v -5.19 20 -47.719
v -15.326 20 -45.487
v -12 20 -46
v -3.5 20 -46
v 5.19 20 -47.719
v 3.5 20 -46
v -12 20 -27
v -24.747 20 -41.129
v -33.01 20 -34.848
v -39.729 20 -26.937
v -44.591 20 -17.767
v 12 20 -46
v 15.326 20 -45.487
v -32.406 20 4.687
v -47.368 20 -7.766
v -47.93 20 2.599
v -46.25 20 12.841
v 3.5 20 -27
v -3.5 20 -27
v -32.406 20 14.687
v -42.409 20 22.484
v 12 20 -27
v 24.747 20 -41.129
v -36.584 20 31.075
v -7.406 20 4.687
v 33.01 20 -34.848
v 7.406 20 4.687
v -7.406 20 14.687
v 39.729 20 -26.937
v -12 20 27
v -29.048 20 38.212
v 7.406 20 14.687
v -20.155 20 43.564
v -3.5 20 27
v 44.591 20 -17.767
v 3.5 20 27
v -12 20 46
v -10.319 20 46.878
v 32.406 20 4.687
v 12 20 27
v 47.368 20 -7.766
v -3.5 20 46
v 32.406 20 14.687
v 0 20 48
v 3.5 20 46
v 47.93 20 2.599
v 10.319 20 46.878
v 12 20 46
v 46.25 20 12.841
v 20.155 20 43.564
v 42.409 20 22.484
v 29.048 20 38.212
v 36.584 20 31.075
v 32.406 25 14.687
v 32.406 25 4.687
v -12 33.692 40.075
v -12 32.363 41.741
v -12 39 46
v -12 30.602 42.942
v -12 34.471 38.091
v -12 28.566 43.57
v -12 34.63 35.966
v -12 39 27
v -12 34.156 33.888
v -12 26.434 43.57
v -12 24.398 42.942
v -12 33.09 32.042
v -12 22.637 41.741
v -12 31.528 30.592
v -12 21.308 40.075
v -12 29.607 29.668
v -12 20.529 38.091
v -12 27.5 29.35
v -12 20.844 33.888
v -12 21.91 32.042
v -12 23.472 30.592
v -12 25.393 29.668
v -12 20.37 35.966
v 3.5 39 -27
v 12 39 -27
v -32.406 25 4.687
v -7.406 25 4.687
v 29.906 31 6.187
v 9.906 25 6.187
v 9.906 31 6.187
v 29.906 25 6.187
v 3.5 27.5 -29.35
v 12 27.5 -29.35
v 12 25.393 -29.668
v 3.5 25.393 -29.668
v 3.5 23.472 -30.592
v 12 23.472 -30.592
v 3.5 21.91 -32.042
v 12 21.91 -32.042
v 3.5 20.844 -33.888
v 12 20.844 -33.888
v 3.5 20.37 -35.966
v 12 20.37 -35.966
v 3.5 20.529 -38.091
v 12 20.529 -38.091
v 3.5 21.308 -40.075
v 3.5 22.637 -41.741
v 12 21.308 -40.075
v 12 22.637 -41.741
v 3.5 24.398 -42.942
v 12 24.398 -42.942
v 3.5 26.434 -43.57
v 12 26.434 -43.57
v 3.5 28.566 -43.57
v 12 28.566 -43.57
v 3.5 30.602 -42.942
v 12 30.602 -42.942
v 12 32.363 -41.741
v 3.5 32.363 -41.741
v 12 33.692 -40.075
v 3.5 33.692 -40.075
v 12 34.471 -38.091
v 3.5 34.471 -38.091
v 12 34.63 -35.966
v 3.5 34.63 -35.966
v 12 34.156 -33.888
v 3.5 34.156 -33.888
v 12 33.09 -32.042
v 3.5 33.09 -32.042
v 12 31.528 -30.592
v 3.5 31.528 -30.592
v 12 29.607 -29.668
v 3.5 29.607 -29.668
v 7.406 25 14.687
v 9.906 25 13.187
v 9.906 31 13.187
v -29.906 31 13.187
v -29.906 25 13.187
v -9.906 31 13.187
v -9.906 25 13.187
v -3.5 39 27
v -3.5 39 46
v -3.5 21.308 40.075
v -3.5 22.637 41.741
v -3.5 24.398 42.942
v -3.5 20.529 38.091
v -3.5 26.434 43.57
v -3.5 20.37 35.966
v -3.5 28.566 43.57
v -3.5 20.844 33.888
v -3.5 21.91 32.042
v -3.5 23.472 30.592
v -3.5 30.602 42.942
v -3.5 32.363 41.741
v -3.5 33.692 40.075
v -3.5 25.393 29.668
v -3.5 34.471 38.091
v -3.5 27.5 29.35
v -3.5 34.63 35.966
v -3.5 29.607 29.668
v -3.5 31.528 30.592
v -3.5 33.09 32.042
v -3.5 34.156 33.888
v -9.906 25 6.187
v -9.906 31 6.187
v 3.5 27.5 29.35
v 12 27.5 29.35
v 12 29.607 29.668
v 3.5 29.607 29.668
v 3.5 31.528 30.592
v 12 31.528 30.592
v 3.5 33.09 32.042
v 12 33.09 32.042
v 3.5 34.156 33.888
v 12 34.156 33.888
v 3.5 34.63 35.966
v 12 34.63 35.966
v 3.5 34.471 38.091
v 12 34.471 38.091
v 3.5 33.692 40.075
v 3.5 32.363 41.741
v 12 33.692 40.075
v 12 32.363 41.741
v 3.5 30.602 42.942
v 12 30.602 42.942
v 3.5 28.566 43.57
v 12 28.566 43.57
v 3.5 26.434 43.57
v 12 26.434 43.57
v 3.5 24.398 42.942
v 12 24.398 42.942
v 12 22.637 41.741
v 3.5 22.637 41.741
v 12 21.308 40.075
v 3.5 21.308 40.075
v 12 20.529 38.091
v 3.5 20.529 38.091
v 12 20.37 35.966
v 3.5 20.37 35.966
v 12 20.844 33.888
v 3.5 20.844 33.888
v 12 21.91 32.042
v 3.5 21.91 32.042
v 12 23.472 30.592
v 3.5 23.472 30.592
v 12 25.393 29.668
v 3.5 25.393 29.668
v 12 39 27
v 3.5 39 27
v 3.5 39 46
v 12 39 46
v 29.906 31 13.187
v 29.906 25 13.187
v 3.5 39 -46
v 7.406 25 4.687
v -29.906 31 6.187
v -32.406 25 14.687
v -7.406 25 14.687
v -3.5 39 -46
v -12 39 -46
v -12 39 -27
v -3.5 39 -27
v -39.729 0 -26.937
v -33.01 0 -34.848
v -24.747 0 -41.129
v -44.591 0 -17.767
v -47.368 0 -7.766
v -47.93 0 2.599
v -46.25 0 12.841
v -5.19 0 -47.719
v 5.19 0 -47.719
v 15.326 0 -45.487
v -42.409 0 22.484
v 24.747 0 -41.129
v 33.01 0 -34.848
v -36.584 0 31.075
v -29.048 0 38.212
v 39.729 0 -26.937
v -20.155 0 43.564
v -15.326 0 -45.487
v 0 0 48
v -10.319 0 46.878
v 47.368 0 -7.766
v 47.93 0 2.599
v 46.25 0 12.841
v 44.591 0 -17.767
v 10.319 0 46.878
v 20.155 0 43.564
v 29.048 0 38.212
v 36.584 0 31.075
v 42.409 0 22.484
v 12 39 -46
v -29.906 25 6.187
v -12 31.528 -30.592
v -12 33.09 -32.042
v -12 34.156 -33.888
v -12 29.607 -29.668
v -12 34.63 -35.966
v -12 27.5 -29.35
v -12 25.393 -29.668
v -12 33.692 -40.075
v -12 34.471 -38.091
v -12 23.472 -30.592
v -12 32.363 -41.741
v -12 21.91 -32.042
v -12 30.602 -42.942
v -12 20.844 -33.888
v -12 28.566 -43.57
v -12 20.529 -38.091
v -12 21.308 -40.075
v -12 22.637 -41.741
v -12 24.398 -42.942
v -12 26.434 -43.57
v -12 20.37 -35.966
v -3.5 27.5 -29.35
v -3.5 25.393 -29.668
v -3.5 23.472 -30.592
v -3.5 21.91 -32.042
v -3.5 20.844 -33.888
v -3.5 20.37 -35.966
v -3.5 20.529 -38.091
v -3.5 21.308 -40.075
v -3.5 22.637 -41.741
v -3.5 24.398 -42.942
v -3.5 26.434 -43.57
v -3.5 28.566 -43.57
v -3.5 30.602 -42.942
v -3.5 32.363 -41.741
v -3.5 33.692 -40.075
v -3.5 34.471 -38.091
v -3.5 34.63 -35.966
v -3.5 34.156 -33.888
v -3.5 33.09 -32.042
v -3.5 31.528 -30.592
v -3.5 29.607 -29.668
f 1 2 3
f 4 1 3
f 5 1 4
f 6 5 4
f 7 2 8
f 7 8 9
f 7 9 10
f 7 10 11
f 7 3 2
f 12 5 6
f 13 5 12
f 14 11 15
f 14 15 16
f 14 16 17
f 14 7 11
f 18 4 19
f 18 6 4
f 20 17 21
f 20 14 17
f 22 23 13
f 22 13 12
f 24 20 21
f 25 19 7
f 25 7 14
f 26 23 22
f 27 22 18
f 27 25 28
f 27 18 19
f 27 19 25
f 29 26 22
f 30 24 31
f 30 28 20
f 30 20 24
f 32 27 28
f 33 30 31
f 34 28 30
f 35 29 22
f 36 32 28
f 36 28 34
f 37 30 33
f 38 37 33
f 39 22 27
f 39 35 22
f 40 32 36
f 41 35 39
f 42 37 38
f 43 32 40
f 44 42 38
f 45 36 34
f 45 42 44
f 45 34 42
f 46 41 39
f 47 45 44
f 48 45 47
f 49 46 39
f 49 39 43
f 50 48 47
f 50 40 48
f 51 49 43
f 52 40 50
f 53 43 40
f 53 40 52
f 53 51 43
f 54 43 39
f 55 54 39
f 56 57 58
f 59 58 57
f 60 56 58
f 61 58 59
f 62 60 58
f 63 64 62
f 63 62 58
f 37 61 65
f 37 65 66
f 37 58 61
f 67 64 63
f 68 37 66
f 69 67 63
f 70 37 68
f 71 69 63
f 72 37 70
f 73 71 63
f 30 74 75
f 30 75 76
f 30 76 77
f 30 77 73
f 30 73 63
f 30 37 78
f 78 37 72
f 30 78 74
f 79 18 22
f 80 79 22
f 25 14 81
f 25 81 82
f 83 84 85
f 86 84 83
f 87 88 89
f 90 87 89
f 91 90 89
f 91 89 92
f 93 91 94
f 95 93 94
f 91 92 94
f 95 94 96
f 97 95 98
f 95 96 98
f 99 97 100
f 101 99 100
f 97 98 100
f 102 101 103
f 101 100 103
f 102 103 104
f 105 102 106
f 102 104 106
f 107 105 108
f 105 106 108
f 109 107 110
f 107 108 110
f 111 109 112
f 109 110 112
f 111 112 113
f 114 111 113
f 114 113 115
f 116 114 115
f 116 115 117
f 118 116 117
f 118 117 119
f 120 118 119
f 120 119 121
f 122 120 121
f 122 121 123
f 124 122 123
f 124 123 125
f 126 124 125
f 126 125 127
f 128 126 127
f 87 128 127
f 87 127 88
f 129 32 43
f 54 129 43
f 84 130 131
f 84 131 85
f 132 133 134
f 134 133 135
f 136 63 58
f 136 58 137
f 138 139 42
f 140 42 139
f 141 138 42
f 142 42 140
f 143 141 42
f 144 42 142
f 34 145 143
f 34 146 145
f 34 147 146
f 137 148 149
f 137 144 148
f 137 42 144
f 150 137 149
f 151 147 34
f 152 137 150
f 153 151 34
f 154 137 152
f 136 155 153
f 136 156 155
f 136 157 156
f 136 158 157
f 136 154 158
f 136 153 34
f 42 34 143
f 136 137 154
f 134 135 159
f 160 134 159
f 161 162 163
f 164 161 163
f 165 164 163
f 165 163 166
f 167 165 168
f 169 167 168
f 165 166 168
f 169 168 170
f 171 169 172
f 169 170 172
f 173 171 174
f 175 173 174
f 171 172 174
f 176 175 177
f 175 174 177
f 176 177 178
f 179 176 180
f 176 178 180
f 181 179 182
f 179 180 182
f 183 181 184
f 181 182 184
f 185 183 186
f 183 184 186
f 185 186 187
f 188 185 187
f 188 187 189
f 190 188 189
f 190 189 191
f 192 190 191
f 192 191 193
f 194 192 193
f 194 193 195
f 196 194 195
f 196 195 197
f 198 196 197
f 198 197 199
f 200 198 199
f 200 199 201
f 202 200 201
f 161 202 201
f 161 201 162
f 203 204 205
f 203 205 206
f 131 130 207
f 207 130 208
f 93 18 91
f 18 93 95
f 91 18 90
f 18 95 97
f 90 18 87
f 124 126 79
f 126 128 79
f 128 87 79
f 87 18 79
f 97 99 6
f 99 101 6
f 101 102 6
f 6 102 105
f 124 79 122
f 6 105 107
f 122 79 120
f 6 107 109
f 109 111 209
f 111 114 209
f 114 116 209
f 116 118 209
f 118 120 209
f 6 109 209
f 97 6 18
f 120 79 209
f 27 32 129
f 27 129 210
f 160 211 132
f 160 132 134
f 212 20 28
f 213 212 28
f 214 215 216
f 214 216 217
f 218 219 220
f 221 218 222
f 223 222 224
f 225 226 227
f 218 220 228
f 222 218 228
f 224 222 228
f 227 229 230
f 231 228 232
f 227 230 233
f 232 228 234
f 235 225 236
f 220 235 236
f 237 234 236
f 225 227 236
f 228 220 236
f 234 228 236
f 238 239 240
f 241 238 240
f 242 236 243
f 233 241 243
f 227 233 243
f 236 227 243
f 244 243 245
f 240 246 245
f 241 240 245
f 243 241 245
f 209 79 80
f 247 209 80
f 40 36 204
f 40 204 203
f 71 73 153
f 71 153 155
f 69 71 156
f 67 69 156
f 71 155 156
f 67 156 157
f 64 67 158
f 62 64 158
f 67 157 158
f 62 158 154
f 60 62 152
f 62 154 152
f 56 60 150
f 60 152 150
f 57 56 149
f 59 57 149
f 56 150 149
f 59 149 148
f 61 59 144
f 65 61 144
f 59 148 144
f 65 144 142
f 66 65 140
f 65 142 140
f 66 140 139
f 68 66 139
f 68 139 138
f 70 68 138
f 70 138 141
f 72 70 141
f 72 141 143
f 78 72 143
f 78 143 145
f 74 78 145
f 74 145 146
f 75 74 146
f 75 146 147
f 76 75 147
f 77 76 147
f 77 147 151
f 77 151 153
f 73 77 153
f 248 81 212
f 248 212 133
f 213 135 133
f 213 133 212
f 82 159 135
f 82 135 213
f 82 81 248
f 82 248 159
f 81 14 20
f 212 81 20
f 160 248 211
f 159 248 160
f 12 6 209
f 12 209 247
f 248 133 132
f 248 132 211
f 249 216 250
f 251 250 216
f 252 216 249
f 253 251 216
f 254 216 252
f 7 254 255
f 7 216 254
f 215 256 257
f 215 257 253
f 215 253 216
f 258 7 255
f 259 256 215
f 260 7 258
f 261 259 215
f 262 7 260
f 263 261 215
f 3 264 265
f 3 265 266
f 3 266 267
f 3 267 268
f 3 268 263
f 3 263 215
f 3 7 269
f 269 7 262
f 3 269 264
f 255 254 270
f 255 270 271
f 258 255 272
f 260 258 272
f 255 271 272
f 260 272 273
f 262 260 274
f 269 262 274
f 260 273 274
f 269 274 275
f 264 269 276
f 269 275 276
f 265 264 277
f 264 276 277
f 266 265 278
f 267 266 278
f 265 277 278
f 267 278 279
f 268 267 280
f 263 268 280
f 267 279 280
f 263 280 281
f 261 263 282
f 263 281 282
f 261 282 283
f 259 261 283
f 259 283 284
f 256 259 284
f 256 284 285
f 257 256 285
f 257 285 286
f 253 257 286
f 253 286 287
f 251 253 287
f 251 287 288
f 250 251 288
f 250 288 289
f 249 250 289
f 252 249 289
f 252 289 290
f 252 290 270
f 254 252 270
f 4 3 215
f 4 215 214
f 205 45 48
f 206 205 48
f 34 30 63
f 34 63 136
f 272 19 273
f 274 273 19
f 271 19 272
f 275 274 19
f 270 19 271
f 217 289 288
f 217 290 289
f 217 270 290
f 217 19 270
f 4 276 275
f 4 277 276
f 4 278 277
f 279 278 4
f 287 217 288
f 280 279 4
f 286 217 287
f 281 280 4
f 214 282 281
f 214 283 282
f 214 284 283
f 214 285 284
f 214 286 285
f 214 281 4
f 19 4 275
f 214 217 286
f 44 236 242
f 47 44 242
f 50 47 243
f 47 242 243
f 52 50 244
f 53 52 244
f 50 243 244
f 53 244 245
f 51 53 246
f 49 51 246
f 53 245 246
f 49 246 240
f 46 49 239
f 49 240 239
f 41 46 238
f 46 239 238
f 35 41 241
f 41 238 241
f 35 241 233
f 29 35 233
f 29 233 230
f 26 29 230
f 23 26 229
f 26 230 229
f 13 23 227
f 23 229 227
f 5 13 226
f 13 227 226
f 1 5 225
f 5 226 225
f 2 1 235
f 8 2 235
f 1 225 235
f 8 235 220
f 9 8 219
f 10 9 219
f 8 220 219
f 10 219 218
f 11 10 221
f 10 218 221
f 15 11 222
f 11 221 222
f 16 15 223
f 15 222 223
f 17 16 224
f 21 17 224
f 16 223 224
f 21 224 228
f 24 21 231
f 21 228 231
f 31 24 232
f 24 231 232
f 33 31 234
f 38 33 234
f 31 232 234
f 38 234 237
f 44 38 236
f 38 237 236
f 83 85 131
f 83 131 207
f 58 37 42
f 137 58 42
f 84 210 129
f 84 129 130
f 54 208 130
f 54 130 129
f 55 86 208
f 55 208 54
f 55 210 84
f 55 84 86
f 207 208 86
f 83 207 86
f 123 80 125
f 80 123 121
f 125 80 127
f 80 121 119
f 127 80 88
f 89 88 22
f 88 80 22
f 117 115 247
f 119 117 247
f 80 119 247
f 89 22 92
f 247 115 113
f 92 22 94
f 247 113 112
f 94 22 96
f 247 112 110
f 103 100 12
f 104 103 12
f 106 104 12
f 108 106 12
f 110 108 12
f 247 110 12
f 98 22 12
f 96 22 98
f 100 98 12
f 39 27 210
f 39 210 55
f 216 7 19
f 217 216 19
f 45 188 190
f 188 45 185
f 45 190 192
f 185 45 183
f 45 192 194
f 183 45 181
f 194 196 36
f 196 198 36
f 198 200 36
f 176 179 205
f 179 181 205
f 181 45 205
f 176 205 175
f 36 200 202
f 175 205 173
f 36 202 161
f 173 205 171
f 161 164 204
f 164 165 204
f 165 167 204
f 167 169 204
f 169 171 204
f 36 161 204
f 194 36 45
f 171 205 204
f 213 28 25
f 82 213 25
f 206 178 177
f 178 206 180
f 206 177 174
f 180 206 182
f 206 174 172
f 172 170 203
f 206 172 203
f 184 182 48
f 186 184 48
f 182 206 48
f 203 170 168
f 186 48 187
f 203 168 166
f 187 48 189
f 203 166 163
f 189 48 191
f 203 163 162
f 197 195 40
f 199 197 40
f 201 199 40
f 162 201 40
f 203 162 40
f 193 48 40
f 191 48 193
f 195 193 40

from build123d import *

# Parameters (mm, degrees)
SKETCH3_R           = 48
BOSS_EXTRUDE2_DEPTH = 20
SKETCH4_W           = 25
SKETCH4_H           = 5
SKETCH4_H_2         = 10
BOSS_EXTRUDE4_DEPTH = 5
SKETCH5_W           = 20
SKETCH5_H           = 7
BOSS_EXTRUDE5_DEPTH = 6
SKETCH6_W           = 24
SKETCH6_H           = 19
BOSS_EXTRUDE6_DEPTH = 19
SKETCH7_R           = 7.15
CUT_EXTRUDE1_DEPTH  = 28
SKETCH8_W           = 3.5
SKETCH8_H           = 19
SKETCH8_W_2         = 7
CUT_EXTRUDE2_DEPTH  = 19


with BuildPart() as part:
    # Sketch3 → Boss-Extrude2 (new body)
    with BuildSketch(Plane(origin=(0, 0, 0), x_dir=(1, 0, 0), z_dir=(0, 1, 0))):
        with Locations(Location((0, 0, 0), (0, 0, 270))):
            Circle(SKETCH3_R)
    extrude(amount=BOSS_EXTRUDE2_DEPTH)

    # Sketch4 → Boss-Extrude4 (add)
    with BuildSketch(Plane(origin=(0, 20, 0), x_dir=(1, 0, 0), z_dir=(0, 1, 0))):
        with Locations((-19.905756196, -7.187203126)):
            Rectangle(SKETCH4_W, SKETCH4_H)
        with Locations((-19.905756196, -12.187203126)):
            Rectangle(SKETCH4_W, SKETCH4_H)
        with Locations((19.905756196, -9.687203126)):
            Rectangle(SKETCH4_W, SKETCH4_H_2)
    extrude(amount=BOSS_EXTRUDE4_DEPTH)

    # Sketch5 → Boss-Extrude5 (add)
    with BuildSketch(Plane(origin=(0, 25, 0), x_dir=(1, 0, 0), z_dir=(0, 1, 0))):
        with Locations((19.905756196, -9.687203126)):
            Rectangle(SKETCH5_W, SKETCH5_H)
        with Locations((-19.905756196, -9.687203126)):
            Rectangle(SKETCH5_W, SKETCH5_H)
    extrude(amount=BOSS_EXTRUDE5_DEPTH)

    # Sketch6 → Boss-Extrude6 (add)
    with BuildSketch(Plane(origin=(0, 20, 0), x_dir=(1, 0, 0), z_dir=(0, 1, 0))):
        with Locations((0, -36.5)):
            Rectangle(SKETCH6_W, SKETCH6_H)
        with Locations((0, 36.5)):
            Rectangle(SKETCH6_W, SKETCH6_H)
    extrude(amount=BOSS_EXTRUDE6_DEPTH)

    # Sketch7 → Cut-Extrude1 (cut)
    with BuildSketch(Plane(origin=(12, 0, 0), x_dir=(0, 0, -1), z_dir=(1, 0, 0))):
        with Locations((-36.5, 27.5)):
            Circle(SKETCH7_R)
        with Locations(Location((36.5, 27.5, 0), (0, 0, 180))):
            Circle(SKETCH7_R)
    extrude(amount=-CUT_EXTRUDE1_DEPTH, mode=Mode.SUBTRACT)

    # Sketch8 → Cut-Extrude2 (cut)
    with BuildSketch(Plane(origin=(0, 39, 0), x_dir=(1, 0, 0), z_dir=(0, 1, 0))):
        with Locations((-1.75, -36.5)):
            Rectangle(SKETCH8_W, SKETCH8_H)
        with Locations((1.75, -36.5)):
            Rectangle(SKETCH8_W, SKETCH8_H)
        with Locations((0, 36.5)):
            Rectangle(SKETCH8_W_2, SKETCH8_H)
    extrude(amount=-CUT_EXTRUDE2_DEPTH, mode=Mode.SUBTRACT)


solid = part.part
